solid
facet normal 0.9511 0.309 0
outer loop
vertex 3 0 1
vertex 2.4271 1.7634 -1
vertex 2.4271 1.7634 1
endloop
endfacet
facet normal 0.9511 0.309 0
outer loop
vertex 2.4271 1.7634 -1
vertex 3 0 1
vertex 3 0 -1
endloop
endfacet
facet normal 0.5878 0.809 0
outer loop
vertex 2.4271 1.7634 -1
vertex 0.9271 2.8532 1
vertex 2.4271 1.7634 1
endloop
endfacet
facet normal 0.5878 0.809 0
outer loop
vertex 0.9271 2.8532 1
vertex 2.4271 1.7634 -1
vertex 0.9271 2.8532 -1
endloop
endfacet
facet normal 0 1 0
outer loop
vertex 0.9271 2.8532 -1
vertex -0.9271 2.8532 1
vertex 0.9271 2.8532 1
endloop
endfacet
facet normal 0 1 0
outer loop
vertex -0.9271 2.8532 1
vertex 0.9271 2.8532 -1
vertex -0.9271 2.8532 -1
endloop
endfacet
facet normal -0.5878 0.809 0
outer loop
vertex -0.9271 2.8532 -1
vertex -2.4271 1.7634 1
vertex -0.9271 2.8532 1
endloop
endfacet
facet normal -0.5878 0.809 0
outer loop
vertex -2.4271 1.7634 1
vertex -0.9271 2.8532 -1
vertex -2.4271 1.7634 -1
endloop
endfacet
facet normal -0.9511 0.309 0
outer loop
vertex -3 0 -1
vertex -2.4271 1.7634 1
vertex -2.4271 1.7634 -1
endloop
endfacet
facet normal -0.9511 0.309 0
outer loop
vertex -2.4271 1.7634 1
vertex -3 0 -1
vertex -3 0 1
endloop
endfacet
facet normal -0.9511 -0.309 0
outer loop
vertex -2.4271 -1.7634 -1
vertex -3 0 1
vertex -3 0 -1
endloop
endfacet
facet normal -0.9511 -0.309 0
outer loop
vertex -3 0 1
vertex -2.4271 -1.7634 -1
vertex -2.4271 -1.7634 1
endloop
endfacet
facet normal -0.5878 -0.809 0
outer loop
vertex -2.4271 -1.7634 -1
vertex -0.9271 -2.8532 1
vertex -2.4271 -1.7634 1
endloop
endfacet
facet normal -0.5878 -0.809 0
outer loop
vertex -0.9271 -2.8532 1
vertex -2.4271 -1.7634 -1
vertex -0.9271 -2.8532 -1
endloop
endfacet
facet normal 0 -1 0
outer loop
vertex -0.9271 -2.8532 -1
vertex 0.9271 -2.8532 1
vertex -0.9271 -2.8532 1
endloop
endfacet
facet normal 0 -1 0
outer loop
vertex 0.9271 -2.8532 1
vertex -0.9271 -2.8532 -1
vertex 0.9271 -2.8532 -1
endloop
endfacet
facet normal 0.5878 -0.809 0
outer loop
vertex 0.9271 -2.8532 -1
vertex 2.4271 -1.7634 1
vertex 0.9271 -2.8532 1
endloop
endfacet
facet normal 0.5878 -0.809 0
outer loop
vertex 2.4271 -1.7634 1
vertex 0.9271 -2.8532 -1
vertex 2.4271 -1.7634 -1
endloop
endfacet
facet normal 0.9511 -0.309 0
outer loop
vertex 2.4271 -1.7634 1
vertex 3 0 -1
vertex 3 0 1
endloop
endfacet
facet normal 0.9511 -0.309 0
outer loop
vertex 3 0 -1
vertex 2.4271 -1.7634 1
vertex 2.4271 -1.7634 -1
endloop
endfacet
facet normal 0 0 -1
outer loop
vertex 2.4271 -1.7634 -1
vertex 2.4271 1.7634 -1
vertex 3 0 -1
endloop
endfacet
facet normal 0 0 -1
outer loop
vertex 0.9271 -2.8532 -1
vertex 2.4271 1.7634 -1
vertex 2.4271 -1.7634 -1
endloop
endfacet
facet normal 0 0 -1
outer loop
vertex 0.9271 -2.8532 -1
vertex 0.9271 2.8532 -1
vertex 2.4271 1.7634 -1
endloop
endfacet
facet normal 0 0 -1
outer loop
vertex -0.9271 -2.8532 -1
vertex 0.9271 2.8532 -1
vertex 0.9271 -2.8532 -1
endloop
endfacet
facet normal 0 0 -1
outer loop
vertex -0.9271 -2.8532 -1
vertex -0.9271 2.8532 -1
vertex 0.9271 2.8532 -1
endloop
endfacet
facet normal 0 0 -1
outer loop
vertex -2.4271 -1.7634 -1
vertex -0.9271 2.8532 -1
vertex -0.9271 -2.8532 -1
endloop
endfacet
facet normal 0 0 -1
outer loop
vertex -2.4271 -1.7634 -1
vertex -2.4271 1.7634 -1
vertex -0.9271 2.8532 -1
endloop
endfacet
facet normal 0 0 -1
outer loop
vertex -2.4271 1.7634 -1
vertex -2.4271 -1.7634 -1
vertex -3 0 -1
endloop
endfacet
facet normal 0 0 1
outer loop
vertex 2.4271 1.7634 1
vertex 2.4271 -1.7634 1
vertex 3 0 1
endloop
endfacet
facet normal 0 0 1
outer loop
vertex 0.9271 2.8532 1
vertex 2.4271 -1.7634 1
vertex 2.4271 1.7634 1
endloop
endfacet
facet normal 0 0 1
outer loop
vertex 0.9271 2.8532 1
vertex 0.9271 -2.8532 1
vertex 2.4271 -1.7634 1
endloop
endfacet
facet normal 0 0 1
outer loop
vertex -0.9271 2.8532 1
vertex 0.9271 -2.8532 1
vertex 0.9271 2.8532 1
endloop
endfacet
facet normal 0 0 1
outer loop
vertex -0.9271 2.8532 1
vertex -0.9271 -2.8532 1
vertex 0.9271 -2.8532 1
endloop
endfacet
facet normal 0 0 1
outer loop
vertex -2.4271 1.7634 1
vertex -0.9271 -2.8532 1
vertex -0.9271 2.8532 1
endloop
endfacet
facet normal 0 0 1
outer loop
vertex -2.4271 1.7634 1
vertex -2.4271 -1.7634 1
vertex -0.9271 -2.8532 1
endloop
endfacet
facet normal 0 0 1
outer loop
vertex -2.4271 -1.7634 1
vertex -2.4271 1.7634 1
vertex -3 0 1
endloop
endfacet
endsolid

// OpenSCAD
// file: myCylinder.scad
// Copyright Stephen Morrisson 2017
// All rights reserved


module rhCentCylinder(c, rRadius, z)
{
    color(c) cylinder(h=z, r=rRadius, center=true);
}
rhCentCylinder("red", 3, 2);
// file: myCube.scad
// Copyright Stephen Morrisson 2017
// All rights reserved

module xyzCube(c, x, y, z)
{
    color(c) cube([x, y, z], false);
}

module rotCube(c, rotX, rotY, rotZ, x, y, z)
{
    rotate([rotX, rotY, rotZ]) xyzCube(c, x, y, z);
}
translate([-15, 15, 0,])rotCube("green", 45, 45, 45, 2,2,2);

module transCube(c, xOffset, yOffset, zOffset, x, y, z)
{
    translate([xOffset, yOffset, zOffset]) xyzCube(c, x, y, z);
}
transCube("brown", -15, -15, 0, 3, 2, 1);


module trCube(c, rotX, rotY, rotZ, xO, yO, zO, x, y, z)
{
    translate([xO, yO, zO])
    rotate([rotX, rotY, rotZ])
    xyzCube(c, x, y, z);
}
//trCube("yellow", 0,0,0, 0,0,0, 2, 3, 4);
//trCube("green", 45, 45, 45, 4, 3, 1, 5, 6, 7);
//trCube("blue", 0, 0, 45, 20, 0, 0, 5, 6, 7);
trCube("orange", 0,0,0, -10, 0, 0, 1,1,1);
//trCube("orange", 45,0,0, -15, 0, 0, 1,1,1);
//trCube("orange", 0,45,0, -20, 0, 0, 1,1,1);
//trCube("orange", 0,0,45, -25, 0, 0, 1,1,1);
// main file
// Copyright Stephen Morrisson 2017
// All rights reserved

use <myCube.scad>
use <myCylinder.scad>

rhCentCylinder("red", 3, 2);
